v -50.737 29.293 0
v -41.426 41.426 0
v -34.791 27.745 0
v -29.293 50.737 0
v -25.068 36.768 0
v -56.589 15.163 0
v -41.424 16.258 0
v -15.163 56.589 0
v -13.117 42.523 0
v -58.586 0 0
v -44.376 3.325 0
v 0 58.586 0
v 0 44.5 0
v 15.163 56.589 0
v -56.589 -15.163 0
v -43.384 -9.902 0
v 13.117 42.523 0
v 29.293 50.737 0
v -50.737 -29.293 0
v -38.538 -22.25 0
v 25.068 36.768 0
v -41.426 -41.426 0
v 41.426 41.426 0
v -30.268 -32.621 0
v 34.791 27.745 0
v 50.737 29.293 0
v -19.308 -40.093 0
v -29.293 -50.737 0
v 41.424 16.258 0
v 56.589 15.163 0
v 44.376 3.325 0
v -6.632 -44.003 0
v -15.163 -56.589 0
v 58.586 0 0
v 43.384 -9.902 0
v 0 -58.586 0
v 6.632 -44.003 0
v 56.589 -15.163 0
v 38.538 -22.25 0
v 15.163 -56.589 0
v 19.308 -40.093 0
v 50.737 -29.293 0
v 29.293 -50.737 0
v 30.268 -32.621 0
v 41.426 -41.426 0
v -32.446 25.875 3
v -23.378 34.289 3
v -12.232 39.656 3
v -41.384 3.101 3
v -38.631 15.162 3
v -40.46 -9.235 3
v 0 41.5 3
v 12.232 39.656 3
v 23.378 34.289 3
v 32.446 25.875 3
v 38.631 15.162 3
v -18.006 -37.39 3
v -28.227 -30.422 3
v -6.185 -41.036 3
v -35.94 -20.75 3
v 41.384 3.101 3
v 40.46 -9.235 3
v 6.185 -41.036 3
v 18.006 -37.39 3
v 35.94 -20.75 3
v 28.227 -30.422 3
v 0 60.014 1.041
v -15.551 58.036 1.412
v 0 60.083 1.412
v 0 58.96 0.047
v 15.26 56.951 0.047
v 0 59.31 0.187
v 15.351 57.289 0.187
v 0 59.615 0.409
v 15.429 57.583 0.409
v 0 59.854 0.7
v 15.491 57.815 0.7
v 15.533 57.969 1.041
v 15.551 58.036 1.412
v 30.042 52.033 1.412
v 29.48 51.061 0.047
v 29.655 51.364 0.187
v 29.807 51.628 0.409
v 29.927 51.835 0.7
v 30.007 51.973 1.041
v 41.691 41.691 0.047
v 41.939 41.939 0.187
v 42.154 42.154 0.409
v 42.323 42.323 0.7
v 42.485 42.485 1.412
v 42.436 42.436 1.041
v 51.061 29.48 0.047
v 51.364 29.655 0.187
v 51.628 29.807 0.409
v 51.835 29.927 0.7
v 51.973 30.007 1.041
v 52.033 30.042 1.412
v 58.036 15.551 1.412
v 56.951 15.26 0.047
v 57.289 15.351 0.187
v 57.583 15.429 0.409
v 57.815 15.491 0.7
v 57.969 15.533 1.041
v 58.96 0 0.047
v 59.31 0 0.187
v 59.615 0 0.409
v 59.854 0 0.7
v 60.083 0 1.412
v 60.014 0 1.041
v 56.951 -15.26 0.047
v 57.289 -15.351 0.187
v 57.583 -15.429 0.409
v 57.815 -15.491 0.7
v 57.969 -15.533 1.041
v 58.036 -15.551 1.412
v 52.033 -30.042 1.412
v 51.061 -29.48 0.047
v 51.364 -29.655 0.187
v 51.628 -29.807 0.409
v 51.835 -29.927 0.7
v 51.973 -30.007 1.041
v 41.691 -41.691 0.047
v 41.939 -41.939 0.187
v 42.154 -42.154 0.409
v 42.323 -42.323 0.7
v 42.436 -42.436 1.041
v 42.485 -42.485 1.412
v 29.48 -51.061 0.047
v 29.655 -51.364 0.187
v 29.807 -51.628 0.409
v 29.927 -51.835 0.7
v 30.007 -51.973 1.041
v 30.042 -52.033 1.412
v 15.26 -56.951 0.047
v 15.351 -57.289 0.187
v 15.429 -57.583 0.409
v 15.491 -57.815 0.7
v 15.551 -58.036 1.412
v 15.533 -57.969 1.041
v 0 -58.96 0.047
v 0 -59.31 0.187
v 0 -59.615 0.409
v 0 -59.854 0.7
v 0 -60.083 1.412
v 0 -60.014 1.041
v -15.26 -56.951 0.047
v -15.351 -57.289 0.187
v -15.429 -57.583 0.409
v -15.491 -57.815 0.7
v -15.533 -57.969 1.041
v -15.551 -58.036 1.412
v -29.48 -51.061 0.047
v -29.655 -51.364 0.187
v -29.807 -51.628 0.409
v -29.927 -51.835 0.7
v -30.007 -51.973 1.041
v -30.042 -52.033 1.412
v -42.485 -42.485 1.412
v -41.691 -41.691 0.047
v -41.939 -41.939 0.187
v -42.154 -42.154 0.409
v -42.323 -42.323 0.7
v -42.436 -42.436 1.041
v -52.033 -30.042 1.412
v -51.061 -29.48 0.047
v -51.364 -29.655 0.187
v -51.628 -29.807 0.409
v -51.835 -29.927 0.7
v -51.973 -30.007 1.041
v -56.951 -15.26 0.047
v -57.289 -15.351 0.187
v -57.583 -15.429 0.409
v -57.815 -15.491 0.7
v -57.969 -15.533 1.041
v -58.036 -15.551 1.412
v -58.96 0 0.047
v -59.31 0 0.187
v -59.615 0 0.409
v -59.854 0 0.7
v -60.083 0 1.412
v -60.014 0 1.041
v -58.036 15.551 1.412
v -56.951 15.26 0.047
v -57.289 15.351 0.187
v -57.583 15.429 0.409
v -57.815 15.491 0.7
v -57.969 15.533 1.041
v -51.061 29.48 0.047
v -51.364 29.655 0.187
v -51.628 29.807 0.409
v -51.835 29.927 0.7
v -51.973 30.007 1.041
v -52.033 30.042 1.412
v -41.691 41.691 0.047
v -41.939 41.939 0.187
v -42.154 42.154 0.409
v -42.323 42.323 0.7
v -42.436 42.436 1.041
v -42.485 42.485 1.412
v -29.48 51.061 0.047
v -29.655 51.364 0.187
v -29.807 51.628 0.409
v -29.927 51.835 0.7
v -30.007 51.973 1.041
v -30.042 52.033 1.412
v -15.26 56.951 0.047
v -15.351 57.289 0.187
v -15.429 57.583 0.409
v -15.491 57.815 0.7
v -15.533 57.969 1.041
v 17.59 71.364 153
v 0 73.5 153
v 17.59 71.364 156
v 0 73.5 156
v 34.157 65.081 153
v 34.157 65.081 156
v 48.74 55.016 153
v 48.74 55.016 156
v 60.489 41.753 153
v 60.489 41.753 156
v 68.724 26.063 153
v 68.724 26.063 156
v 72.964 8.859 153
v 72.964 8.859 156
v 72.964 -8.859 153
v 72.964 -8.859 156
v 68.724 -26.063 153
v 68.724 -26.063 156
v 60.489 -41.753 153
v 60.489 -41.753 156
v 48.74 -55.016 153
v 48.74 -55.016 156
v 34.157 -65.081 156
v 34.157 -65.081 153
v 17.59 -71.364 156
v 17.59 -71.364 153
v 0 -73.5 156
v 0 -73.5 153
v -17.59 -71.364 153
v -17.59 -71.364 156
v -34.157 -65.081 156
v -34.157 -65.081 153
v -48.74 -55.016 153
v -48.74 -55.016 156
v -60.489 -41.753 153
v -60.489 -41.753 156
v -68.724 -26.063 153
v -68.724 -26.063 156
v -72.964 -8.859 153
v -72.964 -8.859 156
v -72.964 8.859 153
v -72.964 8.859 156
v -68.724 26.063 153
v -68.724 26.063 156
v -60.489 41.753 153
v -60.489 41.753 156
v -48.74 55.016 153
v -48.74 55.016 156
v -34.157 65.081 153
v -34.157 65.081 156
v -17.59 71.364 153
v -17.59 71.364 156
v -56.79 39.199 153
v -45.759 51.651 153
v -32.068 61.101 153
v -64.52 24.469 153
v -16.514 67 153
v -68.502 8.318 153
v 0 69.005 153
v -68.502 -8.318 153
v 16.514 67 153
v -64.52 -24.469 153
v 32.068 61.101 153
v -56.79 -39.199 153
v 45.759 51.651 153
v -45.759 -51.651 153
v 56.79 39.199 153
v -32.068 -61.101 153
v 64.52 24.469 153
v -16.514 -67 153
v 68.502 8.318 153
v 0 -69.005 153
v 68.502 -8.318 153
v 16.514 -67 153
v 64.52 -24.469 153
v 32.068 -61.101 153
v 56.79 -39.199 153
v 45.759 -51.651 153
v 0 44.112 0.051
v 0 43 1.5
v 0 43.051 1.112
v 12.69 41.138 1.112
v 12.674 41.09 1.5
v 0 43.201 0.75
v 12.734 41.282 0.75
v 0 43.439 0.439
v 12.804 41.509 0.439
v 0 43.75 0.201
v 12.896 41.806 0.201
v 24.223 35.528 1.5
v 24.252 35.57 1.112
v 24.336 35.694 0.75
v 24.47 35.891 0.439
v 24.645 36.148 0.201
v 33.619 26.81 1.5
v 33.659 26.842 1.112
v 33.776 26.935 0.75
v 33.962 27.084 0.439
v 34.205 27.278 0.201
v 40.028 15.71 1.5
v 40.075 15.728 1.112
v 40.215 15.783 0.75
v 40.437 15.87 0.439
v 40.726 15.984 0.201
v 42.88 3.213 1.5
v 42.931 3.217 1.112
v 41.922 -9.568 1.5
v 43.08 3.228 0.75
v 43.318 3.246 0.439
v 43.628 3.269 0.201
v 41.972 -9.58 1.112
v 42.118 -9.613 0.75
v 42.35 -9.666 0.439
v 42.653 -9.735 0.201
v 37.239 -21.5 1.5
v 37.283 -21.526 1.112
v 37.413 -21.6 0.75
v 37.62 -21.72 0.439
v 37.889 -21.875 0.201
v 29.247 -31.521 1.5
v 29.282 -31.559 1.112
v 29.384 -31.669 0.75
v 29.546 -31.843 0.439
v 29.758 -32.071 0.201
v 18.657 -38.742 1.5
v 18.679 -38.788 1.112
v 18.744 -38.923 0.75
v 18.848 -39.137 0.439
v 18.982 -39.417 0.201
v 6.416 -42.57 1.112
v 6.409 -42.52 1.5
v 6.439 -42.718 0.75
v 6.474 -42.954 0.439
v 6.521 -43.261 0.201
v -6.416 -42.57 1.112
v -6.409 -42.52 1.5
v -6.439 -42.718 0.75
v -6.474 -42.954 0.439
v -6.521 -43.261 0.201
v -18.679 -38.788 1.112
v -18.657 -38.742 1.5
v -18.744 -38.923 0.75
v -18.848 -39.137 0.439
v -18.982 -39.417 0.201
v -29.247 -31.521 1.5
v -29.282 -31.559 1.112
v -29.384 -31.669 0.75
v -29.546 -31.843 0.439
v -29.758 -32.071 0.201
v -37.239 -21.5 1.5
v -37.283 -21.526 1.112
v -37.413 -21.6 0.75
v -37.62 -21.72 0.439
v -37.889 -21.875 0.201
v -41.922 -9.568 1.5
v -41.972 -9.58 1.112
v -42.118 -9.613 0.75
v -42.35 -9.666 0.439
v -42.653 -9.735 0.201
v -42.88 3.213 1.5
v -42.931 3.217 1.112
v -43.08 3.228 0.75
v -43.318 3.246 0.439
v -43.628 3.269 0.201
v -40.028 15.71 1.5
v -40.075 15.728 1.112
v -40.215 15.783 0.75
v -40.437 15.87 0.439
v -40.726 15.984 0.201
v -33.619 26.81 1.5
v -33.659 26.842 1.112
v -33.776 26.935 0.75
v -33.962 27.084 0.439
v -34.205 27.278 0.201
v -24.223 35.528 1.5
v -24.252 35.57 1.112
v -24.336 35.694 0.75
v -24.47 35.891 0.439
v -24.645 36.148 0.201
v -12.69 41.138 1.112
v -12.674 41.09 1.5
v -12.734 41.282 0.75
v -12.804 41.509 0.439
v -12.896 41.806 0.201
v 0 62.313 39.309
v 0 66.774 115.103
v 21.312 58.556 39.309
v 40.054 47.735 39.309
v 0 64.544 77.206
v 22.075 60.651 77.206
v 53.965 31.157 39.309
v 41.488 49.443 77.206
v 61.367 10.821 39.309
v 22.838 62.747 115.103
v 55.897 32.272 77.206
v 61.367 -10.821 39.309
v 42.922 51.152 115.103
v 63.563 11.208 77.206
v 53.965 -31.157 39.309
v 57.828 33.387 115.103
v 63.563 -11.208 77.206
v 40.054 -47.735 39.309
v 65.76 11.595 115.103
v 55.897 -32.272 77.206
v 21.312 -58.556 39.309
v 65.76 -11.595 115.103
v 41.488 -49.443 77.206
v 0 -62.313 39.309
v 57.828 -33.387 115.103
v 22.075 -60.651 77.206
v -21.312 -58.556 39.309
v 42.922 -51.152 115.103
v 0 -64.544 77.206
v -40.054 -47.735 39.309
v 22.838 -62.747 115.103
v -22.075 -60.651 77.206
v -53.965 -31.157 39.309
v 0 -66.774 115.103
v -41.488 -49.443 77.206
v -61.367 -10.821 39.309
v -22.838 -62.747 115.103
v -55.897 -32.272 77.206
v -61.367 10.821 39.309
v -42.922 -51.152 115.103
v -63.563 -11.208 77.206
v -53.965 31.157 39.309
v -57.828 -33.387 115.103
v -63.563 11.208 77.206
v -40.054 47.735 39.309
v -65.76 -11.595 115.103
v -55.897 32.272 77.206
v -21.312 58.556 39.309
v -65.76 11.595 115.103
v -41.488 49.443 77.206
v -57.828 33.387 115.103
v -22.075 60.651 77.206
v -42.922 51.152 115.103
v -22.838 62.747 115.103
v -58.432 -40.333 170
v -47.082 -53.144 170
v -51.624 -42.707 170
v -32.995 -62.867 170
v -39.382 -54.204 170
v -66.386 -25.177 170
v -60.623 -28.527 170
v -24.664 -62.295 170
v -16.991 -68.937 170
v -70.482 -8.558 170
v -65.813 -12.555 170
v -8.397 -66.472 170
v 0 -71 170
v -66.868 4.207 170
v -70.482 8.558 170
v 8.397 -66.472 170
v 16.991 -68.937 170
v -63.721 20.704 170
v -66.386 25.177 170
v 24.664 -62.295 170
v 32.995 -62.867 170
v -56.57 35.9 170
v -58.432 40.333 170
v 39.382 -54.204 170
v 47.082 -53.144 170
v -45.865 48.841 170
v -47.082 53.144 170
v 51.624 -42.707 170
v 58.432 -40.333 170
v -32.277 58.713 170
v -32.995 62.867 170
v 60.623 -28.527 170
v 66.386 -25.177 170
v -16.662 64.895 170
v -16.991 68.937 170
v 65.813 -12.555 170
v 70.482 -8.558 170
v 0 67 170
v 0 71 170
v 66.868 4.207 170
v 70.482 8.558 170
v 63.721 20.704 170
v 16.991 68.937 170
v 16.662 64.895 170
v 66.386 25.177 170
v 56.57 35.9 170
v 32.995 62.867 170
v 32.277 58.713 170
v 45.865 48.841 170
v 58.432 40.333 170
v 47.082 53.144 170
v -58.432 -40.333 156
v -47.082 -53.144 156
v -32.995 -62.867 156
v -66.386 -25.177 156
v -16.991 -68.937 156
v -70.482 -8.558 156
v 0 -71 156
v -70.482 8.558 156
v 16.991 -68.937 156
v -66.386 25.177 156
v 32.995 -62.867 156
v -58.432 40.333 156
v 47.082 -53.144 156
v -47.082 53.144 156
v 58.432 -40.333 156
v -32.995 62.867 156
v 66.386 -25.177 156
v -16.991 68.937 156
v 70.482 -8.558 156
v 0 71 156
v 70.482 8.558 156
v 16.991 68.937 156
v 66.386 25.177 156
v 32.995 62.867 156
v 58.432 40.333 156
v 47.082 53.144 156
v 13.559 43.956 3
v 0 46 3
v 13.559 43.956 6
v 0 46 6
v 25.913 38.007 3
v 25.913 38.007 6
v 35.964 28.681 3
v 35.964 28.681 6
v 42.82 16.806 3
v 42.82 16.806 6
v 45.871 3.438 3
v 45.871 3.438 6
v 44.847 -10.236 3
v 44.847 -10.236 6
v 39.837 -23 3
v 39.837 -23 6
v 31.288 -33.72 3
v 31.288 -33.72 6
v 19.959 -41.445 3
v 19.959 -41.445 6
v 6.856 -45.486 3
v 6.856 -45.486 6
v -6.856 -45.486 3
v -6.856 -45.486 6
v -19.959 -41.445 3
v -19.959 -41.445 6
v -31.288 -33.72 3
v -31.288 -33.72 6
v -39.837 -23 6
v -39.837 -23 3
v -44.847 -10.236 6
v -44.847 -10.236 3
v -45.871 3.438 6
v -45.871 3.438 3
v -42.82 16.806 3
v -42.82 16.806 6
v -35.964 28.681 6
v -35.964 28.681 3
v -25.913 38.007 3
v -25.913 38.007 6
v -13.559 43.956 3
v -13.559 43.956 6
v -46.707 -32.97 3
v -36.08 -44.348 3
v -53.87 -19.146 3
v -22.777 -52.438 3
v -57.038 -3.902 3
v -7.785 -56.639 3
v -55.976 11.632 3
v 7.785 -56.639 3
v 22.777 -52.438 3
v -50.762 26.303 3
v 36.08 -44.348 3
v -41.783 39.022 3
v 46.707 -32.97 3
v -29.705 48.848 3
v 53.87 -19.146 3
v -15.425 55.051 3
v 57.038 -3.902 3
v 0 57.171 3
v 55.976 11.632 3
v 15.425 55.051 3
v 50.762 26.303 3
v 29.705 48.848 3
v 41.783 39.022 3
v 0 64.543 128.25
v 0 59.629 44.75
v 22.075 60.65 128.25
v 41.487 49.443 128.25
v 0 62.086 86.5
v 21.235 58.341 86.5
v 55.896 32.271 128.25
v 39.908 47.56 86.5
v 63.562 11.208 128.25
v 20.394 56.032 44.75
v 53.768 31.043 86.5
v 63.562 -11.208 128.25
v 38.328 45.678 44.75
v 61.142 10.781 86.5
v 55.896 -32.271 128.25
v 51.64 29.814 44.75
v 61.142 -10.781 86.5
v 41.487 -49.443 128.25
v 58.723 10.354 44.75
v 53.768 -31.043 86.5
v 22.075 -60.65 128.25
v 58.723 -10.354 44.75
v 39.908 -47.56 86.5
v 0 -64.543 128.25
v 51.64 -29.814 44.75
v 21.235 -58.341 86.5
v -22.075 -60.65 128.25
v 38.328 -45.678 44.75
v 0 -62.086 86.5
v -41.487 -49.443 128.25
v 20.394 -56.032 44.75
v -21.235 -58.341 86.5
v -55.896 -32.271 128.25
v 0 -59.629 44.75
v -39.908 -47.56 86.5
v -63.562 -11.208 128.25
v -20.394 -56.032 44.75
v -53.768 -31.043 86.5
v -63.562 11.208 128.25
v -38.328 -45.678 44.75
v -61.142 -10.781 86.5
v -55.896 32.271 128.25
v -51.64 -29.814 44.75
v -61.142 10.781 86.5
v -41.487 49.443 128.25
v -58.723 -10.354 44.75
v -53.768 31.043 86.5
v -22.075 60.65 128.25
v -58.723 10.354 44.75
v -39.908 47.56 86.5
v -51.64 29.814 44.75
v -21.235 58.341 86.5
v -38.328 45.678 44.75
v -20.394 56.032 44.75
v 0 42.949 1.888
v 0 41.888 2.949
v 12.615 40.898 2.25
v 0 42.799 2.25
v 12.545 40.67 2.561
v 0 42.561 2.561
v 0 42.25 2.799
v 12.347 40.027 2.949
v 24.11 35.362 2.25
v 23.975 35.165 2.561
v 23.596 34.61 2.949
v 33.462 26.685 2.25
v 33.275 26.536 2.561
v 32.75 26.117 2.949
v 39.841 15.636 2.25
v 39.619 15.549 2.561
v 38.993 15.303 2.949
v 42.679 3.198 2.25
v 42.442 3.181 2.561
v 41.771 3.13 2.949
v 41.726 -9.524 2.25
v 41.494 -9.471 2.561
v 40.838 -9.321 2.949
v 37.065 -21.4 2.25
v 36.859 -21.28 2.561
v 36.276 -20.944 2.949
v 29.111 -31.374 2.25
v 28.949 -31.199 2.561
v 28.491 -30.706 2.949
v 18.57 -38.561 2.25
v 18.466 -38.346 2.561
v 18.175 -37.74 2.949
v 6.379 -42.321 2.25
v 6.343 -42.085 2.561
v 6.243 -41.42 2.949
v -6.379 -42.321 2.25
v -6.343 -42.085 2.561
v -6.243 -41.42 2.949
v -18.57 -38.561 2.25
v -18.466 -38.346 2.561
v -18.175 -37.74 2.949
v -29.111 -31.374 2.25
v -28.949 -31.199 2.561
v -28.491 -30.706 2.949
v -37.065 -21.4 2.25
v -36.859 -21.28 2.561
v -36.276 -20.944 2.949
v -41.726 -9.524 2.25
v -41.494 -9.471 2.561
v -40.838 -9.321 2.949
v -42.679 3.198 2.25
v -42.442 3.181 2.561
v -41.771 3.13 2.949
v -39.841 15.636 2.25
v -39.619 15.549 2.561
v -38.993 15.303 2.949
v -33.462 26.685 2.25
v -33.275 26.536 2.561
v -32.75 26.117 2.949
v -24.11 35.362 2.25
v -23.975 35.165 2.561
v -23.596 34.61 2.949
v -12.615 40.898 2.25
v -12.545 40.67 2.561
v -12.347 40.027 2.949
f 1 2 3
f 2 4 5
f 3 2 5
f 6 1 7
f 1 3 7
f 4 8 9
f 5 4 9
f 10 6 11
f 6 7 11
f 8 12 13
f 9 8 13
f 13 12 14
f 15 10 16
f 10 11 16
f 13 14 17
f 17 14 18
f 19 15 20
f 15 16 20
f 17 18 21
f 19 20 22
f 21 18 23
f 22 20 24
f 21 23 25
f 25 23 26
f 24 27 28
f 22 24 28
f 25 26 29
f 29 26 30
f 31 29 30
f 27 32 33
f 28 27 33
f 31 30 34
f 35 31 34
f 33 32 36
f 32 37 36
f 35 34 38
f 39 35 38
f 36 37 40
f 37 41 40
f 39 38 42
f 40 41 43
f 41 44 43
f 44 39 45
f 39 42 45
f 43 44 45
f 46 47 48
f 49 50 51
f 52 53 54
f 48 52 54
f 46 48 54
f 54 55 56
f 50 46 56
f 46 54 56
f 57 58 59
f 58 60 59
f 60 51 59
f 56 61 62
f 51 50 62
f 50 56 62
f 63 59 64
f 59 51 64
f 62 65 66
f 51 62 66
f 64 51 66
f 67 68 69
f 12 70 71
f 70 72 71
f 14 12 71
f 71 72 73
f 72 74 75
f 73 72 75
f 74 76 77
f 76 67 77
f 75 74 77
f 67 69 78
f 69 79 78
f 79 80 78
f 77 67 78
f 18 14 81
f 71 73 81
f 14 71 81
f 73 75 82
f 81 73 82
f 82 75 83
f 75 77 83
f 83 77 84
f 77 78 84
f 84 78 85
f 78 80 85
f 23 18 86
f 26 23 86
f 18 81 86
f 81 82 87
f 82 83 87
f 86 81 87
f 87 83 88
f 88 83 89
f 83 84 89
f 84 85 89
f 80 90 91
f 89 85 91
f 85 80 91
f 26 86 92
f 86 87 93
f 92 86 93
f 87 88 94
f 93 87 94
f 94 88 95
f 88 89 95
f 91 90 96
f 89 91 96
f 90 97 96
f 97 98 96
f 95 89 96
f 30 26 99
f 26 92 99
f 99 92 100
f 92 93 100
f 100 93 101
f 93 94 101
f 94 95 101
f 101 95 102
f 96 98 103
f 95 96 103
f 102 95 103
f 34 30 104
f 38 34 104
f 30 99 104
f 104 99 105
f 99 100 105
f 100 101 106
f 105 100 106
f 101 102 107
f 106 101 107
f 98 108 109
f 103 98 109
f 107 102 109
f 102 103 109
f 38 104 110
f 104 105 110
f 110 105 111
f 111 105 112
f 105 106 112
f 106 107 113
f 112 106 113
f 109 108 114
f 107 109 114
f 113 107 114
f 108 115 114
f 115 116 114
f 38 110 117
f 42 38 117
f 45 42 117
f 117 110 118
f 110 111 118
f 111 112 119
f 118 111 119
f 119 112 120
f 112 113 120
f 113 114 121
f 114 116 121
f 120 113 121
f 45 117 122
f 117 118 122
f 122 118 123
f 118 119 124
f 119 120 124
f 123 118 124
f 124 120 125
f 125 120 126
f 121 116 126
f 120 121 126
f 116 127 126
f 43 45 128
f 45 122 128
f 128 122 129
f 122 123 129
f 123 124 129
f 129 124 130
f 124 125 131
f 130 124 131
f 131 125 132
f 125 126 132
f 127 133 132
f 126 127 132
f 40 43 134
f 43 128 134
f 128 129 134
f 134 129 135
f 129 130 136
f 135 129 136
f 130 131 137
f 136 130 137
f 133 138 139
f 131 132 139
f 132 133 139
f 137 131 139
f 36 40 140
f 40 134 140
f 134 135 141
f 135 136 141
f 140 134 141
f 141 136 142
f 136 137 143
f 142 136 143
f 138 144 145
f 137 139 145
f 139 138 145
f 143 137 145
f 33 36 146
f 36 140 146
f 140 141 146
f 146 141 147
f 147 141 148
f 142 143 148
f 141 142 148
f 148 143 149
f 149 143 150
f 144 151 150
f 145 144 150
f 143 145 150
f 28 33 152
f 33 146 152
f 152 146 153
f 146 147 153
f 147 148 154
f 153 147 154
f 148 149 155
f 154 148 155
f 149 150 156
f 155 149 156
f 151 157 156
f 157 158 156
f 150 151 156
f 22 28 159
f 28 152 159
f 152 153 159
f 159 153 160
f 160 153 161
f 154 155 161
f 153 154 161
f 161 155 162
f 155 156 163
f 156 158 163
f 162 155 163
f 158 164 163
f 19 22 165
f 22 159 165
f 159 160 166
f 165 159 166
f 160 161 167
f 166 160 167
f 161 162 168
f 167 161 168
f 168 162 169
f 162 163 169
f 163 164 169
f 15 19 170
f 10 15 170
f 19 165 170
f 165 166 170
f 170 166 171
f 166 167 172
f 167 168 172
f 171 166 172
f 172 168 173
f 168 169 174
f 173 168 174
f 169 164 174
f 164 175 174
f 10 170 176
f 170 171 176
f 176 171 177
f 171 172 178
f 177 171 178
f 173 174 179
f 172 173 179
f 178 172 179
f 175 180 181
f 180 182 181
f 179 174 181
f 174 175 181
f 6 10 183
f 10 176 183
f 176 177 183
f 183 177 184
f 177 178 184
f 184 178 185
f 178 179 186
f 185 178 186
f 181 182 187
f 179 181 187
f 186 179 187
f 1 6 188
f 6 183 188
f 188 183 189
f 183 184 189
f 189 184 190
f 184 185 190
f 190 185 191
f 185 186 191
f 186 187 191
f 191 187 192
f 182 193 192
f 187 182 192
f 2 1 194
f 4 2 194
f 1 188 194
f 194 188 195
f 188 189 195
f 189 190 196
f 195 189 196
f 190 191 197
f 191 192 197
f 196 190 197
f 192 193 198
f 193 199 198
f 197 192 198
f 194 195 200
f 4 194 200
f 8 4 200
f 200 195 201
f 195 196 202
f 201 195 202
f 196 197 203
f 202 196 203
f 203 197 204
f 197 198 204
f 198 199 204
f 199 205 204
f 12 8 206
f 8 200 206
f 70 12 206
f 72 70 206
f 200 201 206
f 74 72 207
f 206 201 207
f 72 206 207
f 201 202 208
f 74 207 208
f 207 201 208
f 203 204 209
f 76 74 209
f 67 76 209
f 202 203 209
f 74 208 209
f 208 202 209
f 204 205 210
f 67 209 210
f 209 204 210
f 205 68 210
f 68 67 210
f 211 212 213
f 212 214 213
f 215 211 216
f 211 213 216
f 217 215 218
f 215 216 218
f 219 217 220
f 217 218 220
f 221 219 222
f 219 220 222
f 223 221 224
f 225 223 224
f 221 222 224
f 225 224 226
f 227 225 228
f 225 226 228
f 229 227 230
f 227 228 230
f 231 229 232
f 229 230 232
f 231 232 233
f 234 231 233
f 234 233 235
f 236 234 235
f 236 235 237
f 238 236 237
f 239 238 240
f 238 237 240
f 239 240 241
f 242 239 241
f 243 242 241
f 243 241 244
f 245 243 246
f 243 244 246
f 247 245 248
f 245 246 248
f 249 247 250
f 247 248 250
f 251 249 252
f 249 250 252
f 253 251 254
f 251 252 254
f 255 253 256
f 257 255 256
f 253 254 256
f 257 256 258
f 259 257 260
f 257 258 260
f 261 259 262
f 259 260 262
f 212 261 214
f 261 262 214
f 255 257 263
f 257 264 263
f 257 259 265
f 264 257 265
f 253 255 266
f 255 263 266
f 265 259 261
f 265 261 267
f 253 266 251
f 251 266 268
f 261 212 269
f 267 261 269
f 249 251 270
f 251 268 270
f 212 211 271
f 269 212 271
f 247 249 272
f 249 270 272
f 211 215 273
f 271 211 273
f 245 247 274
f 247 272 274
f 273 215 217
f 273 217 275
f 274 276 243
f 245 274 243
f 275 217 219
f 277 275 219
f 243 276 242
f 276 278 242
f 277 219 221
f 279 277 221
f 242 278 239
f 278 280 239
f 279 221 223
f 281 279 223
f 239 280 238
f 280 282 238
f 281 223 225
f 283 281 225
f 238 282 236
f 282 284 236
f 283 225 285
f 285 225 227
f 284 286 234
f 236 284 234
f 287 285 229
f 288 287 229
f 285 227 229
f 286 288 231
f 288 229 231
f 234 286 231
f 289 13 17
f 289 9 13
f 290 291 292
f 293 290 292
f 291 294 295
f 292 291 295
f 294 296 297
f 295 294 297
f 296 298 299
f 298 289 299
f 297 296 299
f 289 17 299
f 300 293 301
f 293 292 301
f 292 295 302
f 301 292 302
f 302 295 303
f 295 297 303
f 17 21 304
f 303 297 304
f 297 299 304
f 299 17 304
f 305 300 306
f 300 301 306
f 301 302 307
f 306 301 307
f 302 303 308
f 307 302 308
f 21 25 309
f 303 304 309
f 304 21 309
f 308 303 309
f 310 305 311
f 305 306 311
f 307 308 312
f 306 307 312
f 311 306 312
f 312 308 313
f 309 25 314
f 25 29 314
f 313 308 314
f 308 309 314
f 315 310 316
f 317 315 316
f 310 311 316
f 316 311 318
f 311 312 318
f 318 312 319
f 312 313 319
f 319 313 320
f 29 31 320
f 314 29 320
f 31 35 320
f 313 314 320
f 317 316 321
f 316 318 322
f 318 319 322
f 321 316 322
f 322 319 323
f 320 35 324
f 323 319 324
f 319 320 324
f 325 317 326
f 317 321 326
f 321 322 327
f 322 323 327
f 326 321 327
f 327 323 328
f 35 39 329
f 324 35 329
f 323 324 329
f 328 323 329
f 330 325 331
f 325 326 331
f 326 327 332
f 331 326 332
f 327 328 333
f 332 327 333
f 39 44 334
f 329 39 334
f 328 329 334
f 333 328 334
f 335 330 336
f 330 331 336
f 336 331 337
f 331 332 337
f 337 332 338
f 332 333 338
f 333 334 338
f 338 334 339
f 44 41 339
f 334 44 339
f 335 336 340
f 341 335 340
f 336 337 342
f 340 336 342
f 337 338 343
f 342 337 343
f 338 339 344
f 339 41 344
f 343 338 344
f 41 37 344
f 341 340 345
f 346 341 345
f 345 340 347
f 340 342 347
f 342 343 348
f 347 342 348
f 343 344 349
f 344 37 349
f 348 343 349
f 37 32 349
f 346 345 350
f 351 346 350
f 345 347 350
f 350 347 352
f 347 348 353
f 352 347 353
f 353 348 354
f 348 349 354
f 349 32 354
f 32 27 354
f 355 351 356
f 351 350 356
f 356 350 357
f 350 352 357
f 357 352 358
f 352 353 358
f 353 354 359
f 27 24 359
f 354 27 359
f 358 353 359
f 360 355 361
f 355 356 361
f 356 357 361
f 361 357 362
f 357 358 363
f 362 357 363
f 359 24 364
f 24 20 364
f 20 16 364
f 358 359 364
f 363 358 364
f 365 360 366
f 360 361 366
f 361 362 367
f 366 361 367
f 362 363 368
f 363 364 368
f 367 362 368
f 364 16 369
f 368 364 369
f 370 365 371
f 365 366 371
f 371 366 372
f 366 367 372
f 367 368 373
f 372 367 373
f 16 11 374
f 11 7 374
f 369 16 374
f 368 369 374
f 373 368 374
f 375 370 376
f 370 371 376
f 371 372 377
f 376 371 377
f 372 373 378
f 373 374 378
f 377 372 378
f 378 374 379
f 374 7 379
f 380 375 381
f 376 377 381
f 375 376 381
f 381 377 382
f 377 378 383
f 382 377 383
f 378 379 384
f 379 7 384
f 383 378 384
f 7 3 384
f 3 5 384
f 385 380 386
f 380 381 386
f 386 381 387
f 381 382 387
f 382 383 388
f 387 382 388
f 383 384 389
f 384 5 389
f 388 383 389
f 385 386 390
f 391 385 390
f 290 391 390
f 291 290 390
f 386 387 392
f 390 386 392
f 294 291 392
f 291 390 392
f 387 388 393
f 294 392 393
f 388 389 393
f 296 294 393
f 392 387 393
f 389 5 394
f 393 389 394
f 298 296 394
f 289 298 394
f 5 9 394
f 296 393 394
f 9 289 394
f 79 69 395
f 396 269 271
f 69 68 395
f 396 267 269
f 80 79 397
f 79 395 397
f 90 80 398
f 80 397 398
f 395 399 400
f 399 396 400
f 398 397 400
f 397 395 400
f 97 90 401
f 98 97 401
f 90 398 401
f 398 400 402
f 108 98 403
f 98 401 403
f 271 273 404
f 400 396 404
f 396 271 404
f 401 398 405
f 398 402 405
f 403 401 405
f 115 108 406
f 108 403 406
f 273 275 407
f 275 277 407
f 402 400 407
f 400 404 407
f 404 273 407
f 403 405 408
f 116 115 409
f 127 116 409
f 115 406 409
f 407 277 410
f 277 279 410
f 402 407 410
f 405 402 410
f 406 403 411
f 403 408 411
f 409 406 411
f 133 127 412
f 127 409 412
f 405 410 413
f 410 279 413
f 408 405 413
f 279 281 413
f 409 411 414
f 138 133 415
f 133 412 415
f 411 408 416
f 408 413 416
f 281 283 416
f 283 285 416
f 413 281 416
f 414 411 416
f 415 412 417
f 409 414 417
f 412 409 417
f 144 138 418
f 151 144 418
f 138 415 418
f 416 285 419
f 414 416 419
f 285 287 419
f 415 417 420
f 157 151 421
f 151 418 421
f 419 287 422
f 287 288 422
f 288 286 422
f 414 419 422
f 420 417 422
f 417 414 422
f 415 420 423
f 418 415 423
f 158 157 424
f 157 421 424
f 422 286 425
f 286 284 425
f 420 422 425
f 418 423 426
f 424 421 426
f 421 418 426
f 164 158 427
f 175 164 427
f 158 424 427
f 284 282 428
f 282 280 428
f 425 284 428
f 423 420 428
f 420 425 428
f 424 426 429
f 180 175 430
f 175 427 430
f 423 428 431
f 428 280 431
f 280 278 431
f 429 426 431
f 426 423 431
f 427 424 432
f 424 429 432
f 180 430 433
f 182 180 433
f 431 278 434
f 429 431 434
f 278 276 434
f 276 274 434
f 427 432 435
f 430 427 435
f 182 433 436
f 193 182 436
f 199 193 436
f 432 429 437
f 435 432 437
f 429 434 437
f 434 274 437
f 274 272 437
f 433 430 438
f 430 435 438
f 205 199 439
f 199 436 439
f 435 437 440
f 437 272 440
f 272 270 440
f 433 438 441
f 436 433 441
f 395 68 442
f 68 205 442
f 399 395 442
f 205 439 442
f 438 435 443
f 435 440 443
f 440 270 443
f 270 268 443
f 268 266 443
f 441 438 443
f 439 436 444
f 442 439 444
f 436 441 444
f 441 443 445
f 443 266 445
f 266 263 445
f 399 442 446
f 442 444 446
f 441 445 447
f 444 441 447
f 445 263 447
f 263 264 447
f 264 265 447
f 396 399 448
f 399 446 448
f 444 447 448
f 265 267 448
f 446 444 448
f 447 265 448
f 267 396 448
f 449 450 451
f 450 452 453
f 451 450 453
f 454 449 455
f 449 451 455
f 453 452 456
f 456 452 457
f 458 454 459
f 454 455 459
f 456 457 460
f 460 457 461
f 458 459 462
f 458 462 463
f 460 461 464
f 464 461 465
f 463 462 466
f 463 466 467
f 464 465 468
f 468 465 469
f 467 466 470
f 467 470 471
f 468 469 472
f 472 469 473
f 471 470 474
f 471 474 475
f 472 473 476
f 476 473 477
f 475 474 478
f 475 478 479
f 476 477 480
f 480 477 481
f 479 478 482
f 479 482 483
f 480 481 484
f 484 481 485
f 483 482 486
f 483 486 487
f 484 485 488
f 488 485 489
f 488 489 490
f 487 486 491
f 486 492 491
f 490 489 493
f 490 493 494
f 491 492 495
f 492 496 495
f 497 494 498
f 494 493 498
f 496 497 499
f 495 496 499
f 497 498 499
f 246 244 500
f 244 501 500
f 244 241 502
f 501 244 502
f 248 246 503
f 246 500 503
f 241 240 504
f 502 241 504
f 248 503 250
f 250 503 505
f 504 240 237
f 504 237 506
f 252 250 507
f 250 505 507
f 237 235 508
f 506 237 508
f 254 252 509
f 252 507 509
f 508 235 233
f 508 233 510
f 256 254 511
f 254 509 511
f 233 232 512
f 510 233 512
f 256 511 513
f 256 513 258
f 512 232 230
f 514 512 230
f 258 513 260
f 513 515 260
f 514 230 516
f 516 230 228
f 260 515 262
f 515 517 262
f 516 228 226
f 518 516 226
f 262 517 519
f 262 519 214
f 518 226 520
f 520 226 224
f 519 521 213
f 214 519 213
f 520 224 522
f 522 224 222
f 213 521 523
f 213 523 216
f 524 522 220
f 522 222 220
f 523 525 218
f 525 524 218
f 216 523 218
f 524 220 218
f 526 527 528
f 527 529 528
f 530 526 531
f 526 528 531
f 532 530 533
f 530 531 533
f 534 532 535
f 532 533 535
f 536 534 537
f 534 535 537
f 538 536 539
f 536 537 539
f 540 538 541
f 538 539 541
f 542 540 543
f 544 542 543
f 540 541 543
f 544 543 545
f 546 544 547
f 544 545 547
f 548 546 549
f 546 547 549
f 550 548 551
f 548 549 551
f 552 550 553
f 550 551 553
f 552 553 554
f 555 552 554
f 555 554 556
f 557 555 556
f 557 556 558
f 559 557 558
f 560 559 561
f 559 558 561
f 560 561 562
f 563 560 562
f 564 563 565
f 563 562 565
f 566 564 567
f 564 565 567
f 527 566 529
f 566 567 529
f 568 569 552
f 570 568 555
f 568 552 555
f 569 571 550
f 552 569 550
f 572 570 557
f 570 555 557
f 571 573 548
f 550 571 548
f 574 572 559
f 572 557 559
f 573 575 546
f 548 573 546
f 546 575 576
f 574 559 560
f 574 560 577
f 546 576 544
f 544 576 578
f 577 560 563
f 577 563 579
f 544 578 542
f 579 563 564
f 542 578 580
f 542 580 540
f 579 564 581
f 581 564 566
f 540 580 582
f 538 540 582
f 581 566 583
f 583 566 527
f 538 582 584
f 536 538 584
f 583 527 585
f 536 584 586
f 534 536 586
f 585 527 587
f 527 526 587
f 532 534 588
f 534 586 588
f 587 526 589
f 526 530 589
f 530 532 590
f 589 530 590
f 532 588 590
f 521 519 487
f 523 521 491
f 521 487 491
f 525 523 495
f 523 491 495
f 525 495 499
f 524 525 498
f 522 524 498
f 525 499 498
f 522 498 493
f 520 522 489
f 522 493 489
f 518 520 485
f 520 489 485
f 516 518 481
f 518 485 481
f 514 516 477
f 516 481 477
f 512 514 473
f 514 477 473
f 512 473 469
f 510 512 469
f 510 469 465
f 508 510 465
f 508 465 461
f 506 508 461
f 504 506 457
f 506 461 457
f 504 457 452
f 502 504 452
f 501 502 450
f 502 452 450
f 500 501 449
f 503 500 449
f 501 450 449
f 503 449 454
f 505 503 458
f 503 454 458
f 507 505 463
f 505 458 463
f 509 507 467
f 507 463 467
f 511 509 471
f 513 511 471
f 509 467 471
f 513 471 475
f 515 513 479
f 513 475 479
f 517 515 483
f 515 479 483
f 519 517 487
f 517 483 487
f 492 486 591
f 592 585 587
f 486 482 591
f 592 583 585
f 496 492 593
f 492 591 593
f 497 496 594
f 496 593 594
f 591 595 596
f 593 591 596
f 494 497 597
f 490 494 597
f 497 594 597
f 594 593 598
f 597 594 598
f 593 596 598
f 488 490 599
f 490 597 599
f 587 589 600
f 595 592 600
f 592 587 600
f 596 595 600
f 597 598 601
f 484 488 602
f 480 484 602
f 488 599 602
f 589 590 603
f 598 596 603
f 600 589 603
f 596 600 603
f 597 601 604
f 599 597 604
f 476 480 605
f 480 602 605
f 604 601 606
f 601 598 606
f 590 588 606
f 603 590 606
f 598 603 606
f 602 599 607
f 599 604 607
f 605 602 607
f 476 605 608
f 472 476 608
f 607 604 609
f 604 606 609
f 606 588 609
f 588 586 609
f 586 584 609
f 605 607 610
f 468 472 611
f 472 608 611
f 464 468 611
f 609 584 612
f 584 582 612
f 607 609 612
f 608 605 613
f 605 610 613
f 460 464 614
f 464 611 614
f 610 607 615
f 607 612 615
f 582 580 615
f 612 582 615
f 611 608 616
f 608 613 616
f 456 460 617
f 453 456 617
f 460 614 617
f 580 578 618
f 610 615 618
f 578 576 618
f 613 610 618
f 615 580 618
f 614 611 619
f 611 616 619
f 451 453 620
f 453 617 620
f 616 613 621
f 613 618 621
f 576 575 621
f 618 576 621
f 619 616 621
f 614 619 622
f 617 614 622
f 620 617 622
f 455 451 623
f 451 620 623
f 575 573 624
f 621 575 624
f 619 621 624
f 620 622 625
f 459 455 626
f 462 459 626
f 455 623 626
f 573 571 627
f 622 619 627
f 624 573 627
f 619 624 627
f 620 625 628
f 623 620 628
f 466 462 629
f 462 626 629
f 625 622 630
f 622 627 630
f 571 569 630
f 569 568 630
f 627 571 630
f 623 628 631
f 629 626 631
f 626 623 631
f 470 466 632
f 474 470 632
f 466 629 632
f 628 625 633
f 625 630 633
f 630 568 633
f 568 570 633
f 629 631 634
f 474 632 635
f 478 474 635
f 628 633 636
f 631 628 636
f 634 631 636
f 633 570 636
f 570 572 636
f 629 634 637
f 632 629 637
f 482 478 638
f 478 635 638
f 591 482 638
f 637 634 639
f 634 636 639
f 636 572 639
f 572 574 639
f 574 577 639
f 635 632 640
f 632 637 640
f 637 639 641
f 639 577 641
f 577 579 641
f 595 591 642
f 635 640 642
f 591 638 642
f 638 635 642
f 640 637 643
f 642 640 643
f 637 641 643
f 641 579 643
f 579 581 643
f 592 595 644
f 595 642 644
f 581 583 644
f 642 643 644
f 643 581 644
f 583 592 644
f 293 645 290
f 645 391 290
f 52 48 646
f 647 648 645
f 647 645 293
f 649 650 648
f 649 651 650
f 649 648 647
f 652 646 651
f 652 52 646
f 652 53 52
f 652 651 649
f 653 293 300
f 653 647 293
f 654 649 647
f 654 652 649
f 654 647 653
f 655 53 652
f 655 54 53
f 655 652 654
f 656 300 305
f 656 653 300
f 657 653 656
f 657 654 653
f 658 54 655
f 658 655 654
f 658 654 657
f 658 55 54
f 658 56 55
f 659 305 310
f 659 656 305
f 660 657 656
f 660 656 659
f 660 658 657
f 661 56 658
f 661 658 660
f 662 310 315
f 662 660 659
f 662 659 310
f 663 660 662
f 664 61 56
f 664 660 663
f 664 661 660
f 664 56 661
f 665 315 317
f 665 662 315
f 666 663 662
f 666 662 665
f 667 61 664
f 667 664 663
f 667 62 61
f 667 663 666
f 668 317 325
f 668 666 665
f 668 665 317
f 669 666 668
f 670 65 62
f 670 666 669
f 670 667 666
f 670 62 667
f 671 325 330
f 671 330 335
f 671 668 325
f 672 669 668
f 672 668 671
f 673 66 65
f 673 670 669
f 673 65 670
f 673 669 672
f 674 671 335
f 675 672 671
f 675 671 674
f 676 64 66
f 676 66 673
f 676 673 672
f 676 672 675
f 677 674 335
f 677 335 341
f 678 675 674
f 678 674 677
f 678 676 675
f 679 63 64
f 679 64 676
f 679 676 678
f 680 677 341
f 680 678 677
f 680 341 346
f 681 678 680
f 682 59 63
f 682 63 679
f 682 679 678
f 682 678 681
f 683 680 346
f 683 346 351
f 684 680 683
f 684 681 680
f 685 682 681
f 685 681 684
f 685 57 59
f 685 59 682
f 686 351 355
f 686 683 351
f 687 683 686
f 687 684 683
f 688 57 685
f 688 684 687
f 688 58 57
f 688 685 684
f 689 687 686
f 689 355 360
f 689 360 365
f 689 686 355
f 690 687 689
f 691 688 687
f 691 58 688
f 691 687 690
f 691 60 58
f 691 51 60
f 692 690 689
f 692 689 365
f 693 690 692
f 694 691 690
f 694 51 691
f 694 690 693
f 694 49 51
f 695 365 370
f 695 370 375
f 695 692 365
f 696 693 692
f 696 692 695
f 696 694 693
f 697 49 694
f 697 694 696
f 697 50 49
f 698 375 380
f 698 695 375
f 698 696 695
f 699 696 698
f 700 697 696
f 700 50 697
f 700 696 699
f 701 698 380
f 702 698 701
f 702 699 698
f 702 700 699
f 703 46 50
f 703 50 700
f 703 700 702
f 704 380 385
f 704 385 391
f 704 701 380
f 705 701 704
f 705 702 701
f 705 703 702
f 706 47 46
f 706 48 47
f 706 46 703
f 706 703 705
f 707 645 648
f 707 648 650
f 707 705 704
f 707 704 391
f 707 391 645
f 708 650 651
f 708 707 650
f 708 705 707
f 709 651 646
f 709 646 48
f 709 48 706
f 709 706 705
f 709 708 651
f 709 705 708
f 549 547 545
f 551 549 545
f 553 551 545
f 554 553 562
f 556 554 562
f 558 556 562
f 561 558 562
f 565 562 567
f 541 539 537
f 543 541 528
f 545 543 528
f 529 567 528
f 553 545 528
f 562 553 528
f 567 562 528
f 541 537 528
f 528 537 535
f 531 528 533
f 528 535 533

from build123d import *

# Parameters (mm, degrees)
F2_R = 1.49999


# Not quite as in the source:
# - a fillet or chamfer is up to 0.001 mm smaller than in the source, because OpenCascade refuses the exact size


with BuildPart() as f1:
    # F0 (on Right) → F1 (revolve)
    with BuildSketch(Plane.YZ):
        Polygon((43, 3), (43, 0), (60, 0), (69.0046720892, 153), (73.5, 153), (73.5, 156), (71, 156), (71, 170), (67, 170), (57.1713709877, 3), (46, 3), (46, 6), (0, 6), (0, 3), align=None)
    revolve(axis=Axis((0, 0, 4.5), (0, 0, -1)))

    # F2 (radius 1.5 in the source; OpenCascade refuses exactly that, so slightly less here)
    f2_edges = [f1.edges().sort_by_distance(p)[0] for p in [
        (0, -43, 0),
        (0, -60, 0),
        (0, -43, 3),
    ]]
    fillet(f2_edges, radius=F2_R)


solid = f1.part
